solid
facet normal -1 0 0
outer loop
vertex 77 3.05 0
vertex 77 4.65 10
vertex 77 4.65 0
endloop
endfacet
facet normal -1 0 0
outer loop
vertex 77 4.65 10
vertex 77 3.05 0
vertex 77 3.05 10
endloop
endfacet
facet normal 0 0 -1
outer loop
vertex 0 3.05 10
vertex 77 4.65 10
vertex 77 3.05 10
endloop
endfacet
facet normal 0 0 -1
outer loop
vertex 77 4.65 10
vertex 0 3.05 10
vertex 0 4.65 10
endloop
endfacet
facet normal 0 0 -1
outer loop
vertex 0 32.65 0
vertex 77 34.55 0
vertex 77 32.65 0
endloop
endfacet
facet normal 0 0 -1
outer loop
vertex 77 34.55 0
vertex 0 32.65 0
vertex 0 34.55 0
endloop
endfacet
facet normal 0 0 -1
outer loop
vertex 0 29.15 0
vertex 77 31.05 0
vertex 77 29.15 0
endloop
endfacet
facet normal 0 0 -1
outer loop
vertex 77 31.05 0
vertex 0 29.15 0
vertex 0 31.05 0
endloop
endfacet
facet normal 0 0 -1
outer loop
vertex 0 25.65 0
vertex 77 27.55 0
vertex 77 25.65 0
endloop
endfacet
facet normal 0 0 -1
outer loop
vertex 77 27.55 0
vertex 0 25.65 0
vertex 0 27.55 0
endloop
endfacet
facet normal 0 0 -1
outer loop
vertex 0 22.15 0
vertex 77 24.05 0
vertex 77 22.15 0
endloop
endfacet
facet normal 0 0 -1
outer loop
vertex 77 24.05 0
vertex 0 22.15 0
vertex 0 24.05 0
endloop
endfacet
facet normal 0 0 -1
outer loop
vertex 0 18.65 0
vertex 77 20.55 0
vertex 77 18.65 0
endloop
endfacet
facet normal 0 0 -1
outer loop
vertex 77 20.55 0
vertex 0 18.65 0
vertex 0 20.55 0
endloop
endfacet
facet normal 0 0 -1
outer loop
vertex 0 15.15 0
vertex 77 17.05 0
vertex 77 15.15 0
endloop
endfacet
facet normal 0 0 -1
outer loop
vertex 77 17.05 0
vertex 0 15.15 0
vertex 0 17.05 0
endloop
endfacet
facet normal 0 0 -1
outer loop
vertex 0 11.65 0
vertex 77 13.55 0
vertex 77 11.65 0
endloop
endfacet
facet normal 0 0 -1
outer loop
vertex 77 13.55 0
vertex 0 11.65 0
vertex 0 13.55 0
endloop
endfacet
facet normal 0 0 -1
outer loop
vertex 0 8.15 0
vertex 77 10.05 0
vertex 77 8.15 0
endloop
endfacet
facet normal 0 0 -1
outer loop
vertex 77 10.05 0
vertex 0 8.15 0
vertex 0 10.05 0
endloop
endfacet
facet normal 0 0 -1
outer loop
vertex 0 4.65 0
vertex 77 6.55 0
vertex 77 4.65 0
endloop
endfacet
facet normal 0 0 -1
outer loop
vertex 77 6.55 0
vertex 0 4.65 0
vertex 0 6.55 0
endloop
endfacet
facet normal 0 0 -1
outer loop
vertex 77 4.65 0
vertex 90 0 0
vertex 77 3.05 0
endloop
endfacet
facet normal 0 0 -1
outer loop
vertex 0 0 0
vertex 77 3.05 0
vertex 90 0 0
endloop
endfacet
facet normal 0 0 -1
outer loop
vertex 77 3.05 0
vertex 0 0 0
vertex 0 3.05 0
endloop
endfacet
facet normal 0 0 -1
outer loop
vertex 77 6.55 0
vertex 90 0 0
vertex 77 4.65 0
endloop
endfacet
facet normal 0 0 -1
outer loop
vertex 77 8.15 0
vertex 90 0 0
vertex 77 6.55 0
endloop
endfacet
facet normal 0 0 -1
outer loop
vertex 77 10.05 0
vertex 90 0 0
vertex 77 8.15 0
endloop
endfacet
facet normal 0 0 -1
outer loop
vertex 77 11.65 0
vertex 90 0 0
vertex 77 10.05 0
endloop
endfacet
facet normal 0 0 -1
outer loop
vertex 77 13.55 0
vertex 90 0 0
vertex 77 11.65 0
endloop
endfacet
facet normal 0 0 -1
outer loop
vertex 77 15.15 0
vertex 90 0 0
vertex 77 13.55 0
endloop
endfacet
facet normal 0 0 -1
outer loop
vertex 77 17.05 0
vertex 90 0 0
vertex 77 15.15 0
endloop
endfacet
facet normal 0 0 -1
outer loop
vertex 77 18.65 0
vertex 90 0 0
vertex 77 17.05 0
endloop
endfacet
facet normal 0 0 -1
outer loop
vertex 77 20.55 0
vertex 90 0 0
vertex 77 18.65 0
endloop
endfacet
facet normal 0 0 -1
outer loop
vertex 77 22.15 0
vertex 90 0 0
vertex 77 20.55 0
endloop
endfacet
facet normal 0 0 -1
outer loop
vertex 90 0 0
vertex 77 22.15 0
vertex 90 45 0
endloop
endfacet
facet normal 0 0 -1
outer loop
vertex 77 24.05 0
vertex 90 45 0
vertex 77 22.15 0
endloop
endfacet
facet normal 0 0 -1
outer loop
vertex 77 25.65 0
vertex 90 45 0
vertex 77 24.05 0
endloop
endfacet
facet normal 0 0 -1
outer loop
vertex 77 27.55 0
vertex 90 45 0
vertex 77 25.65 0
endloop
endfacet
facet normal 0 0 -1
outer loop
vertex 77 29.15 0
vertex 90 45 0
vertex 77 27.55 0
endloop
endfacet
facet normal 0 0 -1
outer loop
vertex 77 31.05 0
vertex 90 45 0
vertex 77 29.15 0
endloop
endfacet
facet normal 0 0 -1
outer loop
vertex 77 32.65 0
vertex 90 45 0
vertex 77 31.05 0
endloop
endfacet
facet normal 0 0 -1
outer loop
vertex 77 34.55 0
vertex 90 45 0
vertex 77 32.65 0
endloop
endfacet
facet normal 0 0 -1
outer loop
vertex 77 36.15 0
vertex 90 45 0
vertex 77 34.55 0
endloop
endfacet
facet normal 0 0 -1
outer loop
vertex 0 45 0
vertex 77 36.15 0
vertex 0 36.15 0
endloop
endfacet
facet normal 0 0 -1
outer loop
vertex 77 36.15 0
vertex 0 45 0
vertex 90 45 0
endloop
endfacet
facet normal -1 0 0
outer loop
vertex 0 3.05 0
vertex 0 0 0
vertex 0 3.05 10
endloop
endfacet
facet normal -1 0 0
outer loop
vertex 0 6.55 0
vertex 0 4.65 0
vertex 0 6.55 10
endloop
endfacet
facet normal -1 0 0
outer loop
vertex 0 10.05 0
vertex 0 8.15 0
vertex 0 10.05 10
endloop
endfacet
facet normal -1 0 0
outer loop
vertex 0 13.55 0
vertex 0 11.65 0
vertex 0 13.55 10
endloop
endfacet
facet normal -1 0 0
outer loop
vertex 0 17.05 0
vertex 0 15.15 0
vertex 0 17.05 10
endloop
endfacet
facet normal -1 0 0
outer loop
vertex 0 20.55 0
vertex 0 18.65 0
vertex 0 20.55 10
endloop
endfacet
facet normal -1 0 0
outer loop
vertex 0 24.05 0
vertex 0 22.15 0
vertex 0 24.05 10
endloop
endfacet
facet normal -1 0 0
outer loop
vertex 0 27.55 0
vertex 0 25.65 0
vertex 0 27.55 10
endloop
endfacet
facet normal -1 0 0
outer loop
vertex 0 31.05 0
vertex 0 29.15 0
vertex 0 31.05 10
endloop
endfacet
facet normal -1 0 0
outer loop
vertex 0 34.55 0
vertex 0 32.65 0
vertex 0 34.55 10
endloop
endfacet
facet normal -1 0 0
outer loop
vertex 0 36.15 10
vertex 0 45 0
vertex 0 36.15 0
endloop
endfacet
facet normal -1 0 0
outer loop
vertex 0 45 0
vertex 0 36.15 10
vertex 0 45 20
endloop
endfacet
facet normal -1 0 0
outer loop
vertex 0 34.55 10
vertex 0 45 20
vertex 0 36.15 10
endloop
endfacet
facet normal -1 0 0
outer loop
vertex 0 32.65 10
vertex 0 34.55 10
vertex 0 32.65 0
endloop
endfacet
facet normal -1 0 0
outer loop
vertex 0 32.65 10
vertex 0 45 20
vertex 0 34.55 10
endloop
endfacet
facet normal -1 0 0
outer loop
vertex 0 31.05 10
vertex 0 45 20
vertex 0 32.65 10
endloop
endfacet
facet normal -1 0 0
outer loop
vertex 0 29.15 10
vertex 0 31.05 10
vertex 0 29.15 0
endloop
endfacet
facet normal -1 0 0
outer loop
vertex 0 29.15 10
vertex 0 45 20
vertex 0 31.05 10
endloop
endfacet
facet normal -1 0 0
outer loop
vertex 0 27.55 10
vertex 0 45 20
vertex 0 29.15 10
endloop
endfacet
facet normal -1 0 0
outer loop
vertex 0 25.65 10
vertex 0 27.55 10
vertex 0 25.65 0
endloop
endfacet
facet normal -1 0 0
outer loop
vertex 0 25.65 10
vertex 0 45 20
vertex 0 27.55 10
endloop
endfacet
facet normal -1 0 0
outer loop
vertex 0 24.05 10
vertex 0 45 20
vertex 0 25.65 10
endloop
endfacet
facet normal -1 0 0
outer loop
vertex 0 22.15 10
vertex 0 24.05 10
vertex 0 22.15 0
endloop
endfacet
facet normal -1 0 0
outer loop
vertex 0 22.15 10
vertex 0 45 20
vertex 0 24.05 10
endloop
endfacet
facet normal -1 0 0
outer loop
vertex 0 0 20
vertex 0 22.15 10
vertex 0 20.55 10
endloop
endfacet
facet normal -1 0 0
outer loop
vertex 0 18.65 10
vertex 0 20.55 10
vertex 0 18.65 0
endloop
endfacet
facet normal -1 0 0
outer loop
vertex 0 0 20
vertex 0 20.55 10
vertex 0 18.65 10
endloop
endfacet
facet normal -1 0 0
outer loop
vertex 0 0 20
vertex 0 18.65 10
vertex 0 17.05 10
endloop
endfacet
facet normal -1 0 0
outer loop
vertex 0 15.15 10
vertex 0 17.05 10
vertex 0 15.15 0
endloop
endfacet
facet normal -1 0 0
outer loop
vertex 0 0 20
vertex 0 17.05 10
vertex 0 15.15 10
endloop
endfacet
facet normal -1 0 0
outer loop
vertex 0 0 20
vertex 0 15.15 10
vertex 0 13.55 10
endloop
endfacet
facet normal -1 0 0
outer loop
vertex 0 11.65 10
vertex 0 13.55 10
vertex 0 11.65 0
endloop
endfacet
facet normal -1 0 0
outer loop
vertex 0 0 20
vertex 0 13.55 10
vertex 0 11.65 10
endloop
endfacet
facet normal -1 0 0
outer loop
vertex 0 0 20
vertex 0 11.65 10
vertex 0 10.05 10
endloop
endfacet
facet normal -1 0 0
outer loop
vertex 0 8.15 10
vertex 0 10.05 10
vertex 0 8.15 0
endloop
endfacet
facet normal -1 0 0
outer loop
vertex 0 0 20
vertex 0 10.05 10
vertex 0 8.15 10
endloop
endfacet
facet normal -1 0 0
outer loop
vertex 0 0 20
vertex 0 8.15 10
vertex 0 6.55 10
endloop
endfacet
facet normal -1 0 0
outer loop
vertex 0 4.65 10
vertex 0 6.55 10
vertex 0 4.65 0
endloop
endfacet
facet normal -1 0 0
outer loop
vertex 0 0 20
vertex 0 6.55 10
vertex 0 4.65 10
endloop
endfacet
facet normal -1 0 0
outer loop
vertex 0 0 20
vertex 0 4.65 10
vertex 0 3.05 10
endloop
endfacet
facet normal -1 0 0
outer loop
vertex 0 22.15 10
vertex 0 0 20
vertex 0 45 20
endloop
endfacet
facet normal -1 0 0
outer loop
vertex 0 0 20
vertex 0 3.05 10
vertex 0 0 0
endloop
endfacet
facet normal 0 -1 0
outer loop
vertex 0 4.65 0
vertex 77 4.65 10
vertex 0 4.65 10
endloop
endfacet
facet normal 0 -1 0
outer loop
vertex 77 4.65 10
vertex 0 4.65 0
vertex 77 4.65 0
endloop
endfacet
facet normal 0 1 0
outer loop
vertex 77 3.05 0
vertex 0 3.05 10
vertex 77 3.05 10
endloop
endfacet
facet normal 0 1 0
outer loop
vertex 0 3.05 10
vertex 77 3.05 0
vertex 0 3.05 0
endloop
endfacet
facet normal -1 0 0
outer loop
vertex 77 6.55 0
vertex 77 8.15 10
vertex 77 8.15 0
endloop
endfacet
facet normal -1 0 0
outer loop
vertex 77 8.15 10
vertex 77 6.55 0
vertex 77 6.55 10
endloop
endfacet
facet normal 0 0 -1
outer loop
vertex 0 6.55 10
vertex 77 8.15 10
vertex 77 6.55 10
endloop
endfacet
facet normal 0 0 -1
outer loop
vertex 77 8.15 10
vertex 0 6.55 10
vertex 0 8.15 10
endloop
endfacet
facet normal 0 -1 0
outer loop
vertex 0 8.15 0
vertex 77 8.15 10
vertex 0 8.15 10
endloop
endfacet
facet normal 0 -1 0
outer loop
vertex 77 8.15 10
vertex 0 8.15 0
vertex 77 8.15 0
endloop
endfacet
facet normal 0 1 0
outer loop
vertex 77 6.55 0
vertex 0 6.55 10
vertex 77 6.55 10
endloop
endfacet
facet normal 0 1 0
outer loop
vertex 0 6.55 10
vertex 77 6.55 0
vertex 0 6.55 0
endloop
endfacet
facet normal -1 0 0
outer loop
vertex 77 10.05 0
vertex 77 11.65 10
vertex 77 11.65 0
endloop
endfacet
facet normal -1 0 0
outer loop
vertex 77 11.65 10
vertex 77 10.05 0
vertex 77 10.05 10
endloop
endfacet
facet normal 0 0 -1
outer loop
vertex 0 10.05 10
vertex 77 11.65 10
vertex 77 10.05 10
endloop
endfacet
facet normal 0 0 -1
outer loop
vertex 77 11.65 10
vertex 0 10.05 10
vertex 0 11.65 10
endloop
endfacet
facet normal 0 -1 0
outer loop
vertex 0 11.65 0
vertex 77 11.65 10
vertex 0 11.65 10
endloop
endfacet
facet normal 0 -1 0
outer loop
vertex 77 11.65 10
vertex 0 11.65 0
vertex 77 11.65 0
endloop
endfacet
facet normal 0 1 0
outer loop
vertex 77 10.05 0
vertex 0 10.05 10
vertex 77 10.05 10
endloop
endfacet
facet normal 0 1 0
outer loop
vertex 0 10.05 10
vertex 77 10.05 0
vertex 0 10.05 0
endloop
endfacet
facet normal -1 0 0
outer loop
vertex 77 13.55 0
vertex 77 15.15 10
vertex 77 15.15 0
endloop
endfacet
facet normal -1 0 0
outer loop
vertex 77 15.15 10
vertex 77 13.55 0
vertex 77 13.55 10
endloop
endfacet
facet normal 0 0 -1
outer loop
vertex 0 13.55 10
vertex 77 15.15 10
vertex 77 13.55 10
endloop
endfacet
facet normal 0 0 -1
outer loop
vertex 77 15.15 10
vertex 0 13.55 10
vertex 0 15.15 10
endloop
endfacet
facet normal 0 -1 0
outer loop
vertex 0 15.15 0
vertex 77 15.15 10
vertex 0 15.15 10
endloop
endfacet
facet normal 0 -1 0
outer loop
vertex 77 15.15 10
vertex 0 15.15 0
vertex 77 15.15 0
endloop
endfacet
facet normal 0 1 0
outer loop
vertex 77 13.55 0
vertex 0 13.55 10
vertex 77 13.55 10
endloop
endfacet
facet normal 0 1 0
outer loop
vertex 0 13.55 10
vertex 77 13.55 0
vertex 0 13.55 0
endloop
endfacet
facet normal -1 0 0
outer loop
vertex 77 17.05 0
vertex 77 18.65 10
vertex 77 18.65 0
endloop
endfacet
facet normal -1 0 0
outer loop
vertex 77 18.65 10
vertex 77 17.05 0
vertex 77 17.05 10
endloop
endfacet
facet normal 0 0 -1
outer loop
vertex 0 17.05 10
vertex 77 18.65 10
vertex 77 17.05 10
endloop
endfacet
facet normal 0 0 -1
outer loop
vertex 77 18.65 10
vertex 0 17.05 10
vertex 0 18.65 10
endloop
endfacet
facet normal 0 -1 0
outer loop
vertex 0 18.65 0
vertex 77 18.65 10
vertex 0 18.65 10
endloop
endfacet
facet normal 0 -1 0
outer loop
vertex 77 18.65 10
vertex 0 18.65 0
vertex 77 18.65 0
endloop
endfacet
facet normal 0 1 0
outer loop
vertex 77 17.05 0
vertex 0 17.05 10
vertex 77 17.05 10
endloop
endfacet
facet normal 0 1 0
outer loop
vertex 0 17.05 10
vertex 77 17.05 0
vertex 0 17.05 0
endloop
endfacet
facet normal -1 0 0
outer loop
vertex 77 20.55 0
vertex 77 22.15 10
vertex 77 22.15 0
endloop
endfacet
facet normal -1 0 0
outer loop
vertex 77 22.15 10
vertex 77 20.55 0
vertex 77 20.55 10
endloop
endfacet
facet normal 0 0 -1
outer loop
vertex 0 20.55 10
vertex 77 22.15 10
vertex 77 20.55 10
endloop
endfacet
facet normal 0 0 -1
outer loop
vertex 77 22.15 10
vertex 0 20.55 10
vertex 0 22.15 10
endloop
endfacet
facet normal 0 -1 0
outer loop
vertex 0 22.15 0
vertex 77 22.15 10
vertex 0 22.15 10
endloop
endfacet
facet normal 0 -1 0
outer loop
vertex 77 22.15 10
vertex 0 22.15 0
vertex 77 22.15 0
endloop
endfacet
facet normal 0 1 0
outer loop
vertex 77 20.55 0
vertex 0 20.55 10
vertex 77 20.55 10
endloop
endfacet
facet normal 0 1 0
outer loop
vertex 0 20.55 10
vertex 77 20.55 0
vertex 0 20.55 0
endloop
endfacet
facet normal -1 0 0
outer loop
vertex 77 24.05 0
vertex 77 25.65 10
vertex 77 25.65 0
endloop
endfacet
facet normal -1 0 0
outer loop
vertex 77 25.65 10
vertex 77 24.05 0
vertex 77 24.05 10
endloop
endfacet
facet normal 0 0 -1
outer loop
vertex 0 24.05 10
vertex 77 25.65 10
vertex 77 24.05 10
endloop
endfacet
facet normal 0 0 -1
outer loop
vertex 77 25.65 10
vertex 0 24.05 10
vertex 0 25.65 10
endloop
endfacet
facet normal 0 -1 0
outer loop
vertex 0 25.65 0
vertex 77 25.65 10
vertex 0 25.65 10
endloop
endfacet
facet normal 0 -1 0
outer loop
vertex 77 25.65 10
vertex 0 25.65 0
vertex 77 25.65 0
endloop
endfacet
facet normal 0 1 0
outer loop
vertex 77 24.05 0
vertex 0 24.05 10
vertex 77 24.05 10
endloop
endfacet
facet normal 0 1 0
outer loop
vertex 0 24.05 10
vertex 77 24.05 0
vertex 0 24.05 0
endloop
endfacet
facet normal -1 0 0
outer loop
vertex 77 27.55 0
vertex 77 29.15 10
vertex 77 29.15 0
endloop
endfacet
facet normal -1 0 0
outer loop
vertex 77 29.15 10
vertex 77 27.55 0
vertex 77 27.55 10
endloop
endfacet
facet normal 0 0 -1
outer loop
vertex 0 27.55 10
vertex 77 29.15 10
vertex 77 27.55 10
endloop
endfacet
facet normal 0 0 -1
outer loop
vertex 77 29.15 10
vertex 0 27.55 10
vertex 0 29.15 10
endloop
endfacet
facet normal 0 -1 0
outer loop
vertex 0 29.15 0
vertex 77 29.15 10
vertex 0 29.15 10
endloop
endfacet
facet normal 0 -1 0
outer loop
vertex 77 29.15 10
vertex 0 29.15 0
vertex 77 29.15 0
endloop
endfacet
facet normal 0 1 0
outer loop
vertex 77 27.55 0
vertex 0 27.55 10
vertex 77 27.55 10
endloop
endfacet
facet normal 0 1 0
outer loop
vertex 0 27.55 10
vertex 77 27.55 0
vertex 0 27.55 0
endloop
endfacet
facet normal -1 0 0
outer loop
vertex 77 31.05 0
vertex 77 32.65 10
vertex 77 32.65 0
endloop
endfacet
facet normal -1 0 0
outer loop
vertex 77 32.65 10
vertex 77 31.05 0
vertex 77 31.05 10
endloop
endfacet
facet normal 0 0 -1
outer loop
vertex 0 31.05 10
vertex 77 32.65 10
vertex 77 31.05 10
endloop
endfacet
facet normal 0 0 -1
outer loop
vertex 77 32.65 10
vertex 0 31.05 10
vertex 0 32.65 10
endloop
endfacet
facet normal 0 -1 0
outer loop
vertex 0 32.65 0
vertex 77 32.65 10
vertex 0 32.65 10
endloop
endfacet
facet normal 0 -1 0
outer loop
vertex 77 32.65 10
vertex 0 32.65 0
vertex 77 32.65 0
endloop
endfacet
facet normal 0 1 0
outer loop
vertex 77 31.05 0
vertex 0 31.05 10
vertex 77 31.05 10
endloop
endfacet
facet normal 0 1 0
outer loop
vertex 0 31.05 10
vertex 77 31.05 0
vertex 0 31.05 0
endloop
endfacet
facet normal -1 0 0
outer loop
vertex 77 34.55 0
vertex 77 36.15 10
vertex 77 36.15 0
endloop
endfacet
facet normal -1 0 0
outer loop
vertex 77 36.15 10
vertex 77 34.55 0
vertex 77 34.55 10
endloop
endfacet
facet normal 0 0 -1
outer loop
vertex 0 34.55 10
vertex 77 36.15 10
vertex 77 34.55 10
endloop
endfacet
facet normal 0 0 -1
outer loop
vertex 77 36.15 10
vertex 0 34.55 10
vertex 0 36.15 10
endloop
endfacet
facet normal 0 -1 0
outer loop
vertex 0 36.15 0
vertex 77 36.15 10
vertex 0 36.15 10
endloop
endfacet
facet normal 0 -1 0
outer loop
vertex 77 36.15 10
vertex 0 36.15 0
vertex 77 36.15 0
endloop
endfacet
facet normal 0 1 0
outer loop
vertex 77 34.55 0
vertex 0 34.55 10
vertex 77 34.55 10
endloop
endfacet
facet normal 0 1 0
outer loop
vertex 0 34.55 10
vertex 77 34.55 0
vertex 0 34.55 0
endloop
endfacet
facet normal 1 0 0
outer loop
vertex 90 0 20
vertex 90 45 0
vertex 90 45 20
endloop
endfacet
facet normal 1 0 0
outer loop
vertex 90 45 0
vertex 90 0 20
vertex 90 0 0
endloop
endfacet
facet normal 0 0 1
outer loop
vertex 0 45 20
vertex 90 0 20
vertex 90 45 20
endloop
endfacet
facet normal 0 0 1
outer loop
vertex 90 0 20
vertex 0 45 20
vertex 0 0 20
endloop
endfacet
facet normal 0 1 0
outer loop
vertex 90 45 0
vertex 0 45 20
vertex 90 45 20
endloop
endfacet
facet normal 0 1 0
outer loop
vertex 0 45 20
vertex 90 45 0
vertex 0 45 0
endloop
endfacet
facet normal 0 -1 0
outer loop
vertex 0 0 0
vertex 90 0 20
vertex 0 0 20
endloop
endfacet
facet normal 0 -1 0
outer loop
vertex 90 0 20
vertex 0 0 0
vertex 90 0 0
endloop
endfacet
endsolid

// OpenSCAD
// Slide drying rack - a solid base block with a row of parallel slots standing up on their long
// edge, for drying 10 x 75 mm microscope slides. NOVEL general part.
//

slides = 10;
base_l = 90;
base_w = 45;
base_h = 20;
slot_l = 77;
slot_w = 1.6;
slot_d = 10;
pitch  = 3.5;

$fn = 48;

margin = slot_w / 2 + pitch / 2 + 0.5;
w      = base_w - 2 * margin;

difference() {
    cube([base_l, base_w, base_h]);
    for (i = [0 : slides - 1])
        translate([0, margin + i * pitch, 0]) cube([slot_l, slot_w, slot_d]);
}
